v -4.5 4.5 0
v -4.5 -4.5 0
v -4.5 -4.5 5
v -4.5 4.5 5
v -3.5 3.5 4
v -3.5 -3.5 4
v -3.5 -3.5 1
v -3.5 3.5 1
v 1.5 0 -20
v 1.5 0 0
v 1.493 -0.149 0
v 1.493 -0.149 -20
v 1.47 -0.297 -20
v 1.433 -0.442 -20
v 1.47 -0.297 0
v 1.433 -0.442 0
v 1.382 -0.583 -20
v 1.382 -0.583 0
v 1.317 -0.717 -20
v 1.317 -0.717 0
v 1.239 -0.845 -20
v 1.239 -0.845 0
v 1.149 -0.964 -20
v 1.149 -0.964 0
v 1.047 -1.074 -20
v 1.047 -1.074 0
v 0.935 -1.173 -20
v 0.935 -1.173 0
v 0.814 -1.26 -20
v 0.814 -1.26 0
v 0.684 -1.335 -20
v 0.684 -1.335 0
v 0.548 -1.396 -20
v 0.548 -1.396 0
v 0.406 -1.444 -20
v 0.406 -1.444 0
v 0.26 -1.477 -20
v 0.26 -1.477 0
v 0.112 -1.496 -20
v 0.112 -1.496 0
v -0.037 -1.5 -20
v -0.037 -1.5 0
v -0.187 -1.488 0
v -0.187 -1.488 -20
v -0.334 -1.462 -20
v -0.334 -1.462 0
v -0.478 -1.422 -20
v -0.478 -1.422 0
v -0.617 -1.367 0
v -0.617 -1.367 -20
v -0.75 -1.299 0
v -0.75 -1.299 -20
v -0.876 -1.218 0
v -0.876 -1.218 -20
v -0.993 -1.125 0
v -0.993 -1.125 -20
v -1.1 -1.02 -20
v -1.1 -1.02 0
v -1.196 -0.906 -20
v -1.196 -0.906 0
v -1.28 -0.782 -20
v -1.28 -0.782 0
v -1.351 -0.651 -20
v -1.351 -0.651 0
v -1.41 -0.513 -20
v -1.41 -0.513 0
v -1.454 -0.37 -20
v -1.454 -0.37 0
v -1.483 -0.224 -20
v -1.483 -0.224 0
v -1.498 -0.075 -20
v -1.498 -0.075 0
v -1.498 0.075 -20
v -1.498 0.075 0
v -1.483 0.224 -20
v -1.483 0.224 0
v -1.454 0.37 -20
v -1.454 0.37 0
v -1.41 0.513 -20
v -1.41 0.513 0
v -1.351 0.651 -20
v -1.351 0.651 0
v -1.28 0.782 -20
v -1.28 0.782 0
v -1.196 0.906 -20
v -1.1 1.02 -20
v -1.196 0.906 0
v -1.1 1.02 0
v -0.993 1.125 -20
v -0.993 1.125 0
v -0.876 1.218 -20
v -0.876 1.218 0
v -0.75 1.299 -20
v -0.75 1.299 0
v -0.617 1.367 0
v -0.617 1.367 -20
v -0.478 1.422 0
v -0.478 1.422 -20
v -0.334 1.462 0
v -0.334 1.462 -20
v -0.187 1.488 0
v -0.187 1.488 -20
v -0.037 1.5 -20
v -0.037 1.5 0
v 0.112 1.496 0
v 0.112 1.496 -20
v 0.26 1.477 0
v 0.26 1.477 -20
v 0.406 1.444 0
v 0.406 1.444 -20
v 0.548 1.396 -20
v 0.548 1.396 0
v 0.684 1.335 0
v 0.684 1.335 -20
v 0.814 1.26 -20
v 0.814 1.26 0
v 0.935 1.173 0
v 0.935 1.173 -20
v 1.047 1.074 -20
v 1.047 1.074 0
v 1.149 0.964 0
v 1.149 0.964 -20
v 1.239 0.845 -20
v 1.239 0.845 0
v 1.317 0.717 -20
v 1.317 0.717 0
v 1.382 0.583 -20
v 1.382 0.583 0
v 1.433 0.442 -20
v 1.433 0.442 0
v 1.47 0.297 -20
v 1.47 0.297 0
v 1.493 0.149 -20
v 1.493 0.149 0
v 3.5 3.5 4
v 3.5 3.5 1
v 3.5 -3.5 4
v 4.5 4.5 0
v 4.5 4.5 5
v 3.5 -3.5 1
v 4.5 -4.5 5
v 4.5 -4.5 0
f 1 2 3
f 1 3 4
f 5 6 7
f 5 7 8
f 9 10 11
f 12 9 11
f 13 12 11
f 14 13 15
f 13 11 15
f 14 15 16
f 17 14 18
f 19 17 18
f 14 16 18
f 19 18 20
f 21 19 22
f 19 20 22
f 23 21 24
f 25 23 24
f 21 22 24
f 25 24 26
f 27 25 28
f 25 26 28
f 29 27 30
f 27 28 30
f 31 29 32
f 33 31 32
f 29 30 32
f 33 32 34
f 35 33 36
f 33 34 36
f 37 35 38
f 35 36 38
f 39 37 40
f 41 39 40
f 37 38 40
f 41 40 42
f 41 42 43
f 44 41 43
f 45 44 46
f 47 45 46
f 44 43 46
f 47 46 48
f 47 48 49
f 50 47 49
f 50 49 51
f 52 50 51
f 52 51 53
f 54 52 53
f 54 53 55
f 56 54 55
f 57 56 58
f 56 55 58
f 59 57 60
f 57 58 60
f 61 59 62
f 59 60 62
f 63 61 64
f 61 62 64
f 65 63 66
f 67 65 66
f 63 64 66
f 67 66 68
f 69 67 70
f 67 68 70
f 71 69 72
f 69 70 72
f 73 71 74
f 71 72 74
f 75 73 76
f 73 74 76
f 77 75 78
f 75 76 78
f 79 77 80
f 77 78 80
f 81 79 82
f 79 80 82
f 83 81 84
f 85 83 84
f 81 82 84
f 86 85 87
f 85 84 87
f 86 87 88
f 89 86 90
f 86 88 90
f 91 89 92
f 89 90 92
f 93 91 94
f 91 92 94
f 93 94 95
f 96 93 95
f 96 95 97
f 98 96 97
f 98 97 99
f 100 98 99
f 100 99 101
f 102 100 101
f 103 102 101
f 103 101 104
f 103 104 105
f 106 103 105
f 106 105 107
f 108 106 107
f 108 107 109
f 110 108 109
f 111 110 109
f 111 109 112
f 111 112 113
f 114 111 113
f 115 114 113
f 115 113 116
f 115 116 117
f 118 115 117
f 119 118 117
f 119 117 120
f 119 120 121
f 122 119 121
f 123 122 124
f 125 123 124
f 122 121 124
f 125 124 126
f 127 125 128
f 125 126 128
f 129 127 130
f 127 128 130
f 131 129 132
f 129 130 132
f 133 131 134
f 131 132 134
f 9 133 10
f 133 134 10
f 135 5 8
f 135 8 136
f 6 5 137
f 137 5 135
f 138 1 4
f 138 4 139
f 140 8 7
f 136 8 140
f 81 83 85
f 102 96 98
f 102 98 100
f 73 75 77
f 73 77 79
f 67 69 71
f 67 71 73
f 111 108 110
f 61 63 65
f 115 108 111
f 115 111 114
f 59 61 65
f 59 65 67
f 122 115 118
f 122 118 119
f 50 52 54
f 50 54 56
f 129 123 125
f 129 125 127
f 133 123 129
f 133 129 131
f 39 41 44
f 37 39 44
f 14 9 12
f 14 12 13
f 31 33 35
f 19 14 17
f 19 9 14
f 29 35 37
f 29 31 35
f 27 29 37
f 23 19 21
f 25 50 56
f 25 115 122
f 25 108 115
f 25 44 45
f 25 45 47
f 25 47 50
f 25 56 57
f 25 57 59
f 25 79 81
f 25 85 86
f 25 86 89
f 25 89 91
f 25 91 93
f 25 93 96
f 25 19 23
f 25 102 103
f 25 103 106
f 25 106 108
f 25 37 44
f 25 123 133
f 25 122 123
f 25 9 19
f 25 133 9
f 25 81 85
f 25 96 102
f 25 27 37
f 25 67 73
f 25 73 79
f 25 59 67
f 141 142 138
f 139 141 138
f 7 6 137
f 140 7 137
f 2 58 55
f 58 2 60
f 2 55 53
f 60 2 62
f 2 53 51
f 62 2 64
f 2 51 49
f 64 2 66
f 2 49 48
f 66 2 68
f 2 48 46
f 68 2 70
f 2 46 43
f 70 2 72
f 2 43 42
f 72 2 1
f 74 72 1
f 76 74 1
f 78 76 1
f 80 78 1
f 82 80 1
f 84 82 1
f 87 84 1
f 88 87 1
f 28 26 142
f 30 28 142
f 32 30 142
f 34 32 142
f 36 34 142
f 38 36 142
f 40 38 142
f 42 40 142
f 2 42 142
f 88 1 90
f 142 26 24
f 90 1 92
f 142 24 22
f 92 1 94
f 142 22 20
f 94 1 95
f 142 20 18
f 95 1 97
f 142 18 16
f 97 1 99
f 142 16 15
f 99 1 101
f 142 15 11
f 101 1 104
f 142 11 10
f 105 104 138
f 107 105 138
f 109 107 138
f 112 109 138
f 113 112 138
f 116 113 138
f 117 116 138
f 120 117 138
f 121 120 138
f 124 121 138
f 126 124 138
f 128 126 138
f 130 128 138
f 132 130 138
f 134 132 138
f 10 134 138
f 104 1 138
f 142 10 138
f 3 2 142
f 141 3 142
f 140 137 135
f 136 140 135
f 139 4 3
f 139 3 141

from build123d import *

# Parameters (mm, degrees)
SKETCH_W     = 9
SKETCH_H     = 9
PAD_DEPTH    = 5
SKETCH001_R  = 1.5
PAD001_DEPTH = 20
SKETCH002_W  = 7
SKETCH002_H  = 7
POCKET_DEPTH = 3


with BuildPart() as part:
    # Sketch → Pad (new body)
    with BuildSketch(Plane.XY):
        Rectangle(SKETCH_W, SKETCH_H)
    extrude(amount=PAD_DEPTH)

    # Sketch001 (on Face5 of Pad) → Pad001 (join)
    with BuildSketch(Plane(origin=(0, 0, 0), x_dir=(1, 0, 0), z_dir=(0, 0, -1))):
        Circle(SKETCH001_R)
    extrude(amount=PAD001_DEPTH)

    # Sketch002 → Pocket (cut)
    with BuildSketch(Plane.XY.offset(4)):
        Rectangle(SKETCH002_W, SKETCH002_H)
    extrude(amount=-POCKET_DEPTH, mode=Mode.SUBTRACT)


solid = part.part
